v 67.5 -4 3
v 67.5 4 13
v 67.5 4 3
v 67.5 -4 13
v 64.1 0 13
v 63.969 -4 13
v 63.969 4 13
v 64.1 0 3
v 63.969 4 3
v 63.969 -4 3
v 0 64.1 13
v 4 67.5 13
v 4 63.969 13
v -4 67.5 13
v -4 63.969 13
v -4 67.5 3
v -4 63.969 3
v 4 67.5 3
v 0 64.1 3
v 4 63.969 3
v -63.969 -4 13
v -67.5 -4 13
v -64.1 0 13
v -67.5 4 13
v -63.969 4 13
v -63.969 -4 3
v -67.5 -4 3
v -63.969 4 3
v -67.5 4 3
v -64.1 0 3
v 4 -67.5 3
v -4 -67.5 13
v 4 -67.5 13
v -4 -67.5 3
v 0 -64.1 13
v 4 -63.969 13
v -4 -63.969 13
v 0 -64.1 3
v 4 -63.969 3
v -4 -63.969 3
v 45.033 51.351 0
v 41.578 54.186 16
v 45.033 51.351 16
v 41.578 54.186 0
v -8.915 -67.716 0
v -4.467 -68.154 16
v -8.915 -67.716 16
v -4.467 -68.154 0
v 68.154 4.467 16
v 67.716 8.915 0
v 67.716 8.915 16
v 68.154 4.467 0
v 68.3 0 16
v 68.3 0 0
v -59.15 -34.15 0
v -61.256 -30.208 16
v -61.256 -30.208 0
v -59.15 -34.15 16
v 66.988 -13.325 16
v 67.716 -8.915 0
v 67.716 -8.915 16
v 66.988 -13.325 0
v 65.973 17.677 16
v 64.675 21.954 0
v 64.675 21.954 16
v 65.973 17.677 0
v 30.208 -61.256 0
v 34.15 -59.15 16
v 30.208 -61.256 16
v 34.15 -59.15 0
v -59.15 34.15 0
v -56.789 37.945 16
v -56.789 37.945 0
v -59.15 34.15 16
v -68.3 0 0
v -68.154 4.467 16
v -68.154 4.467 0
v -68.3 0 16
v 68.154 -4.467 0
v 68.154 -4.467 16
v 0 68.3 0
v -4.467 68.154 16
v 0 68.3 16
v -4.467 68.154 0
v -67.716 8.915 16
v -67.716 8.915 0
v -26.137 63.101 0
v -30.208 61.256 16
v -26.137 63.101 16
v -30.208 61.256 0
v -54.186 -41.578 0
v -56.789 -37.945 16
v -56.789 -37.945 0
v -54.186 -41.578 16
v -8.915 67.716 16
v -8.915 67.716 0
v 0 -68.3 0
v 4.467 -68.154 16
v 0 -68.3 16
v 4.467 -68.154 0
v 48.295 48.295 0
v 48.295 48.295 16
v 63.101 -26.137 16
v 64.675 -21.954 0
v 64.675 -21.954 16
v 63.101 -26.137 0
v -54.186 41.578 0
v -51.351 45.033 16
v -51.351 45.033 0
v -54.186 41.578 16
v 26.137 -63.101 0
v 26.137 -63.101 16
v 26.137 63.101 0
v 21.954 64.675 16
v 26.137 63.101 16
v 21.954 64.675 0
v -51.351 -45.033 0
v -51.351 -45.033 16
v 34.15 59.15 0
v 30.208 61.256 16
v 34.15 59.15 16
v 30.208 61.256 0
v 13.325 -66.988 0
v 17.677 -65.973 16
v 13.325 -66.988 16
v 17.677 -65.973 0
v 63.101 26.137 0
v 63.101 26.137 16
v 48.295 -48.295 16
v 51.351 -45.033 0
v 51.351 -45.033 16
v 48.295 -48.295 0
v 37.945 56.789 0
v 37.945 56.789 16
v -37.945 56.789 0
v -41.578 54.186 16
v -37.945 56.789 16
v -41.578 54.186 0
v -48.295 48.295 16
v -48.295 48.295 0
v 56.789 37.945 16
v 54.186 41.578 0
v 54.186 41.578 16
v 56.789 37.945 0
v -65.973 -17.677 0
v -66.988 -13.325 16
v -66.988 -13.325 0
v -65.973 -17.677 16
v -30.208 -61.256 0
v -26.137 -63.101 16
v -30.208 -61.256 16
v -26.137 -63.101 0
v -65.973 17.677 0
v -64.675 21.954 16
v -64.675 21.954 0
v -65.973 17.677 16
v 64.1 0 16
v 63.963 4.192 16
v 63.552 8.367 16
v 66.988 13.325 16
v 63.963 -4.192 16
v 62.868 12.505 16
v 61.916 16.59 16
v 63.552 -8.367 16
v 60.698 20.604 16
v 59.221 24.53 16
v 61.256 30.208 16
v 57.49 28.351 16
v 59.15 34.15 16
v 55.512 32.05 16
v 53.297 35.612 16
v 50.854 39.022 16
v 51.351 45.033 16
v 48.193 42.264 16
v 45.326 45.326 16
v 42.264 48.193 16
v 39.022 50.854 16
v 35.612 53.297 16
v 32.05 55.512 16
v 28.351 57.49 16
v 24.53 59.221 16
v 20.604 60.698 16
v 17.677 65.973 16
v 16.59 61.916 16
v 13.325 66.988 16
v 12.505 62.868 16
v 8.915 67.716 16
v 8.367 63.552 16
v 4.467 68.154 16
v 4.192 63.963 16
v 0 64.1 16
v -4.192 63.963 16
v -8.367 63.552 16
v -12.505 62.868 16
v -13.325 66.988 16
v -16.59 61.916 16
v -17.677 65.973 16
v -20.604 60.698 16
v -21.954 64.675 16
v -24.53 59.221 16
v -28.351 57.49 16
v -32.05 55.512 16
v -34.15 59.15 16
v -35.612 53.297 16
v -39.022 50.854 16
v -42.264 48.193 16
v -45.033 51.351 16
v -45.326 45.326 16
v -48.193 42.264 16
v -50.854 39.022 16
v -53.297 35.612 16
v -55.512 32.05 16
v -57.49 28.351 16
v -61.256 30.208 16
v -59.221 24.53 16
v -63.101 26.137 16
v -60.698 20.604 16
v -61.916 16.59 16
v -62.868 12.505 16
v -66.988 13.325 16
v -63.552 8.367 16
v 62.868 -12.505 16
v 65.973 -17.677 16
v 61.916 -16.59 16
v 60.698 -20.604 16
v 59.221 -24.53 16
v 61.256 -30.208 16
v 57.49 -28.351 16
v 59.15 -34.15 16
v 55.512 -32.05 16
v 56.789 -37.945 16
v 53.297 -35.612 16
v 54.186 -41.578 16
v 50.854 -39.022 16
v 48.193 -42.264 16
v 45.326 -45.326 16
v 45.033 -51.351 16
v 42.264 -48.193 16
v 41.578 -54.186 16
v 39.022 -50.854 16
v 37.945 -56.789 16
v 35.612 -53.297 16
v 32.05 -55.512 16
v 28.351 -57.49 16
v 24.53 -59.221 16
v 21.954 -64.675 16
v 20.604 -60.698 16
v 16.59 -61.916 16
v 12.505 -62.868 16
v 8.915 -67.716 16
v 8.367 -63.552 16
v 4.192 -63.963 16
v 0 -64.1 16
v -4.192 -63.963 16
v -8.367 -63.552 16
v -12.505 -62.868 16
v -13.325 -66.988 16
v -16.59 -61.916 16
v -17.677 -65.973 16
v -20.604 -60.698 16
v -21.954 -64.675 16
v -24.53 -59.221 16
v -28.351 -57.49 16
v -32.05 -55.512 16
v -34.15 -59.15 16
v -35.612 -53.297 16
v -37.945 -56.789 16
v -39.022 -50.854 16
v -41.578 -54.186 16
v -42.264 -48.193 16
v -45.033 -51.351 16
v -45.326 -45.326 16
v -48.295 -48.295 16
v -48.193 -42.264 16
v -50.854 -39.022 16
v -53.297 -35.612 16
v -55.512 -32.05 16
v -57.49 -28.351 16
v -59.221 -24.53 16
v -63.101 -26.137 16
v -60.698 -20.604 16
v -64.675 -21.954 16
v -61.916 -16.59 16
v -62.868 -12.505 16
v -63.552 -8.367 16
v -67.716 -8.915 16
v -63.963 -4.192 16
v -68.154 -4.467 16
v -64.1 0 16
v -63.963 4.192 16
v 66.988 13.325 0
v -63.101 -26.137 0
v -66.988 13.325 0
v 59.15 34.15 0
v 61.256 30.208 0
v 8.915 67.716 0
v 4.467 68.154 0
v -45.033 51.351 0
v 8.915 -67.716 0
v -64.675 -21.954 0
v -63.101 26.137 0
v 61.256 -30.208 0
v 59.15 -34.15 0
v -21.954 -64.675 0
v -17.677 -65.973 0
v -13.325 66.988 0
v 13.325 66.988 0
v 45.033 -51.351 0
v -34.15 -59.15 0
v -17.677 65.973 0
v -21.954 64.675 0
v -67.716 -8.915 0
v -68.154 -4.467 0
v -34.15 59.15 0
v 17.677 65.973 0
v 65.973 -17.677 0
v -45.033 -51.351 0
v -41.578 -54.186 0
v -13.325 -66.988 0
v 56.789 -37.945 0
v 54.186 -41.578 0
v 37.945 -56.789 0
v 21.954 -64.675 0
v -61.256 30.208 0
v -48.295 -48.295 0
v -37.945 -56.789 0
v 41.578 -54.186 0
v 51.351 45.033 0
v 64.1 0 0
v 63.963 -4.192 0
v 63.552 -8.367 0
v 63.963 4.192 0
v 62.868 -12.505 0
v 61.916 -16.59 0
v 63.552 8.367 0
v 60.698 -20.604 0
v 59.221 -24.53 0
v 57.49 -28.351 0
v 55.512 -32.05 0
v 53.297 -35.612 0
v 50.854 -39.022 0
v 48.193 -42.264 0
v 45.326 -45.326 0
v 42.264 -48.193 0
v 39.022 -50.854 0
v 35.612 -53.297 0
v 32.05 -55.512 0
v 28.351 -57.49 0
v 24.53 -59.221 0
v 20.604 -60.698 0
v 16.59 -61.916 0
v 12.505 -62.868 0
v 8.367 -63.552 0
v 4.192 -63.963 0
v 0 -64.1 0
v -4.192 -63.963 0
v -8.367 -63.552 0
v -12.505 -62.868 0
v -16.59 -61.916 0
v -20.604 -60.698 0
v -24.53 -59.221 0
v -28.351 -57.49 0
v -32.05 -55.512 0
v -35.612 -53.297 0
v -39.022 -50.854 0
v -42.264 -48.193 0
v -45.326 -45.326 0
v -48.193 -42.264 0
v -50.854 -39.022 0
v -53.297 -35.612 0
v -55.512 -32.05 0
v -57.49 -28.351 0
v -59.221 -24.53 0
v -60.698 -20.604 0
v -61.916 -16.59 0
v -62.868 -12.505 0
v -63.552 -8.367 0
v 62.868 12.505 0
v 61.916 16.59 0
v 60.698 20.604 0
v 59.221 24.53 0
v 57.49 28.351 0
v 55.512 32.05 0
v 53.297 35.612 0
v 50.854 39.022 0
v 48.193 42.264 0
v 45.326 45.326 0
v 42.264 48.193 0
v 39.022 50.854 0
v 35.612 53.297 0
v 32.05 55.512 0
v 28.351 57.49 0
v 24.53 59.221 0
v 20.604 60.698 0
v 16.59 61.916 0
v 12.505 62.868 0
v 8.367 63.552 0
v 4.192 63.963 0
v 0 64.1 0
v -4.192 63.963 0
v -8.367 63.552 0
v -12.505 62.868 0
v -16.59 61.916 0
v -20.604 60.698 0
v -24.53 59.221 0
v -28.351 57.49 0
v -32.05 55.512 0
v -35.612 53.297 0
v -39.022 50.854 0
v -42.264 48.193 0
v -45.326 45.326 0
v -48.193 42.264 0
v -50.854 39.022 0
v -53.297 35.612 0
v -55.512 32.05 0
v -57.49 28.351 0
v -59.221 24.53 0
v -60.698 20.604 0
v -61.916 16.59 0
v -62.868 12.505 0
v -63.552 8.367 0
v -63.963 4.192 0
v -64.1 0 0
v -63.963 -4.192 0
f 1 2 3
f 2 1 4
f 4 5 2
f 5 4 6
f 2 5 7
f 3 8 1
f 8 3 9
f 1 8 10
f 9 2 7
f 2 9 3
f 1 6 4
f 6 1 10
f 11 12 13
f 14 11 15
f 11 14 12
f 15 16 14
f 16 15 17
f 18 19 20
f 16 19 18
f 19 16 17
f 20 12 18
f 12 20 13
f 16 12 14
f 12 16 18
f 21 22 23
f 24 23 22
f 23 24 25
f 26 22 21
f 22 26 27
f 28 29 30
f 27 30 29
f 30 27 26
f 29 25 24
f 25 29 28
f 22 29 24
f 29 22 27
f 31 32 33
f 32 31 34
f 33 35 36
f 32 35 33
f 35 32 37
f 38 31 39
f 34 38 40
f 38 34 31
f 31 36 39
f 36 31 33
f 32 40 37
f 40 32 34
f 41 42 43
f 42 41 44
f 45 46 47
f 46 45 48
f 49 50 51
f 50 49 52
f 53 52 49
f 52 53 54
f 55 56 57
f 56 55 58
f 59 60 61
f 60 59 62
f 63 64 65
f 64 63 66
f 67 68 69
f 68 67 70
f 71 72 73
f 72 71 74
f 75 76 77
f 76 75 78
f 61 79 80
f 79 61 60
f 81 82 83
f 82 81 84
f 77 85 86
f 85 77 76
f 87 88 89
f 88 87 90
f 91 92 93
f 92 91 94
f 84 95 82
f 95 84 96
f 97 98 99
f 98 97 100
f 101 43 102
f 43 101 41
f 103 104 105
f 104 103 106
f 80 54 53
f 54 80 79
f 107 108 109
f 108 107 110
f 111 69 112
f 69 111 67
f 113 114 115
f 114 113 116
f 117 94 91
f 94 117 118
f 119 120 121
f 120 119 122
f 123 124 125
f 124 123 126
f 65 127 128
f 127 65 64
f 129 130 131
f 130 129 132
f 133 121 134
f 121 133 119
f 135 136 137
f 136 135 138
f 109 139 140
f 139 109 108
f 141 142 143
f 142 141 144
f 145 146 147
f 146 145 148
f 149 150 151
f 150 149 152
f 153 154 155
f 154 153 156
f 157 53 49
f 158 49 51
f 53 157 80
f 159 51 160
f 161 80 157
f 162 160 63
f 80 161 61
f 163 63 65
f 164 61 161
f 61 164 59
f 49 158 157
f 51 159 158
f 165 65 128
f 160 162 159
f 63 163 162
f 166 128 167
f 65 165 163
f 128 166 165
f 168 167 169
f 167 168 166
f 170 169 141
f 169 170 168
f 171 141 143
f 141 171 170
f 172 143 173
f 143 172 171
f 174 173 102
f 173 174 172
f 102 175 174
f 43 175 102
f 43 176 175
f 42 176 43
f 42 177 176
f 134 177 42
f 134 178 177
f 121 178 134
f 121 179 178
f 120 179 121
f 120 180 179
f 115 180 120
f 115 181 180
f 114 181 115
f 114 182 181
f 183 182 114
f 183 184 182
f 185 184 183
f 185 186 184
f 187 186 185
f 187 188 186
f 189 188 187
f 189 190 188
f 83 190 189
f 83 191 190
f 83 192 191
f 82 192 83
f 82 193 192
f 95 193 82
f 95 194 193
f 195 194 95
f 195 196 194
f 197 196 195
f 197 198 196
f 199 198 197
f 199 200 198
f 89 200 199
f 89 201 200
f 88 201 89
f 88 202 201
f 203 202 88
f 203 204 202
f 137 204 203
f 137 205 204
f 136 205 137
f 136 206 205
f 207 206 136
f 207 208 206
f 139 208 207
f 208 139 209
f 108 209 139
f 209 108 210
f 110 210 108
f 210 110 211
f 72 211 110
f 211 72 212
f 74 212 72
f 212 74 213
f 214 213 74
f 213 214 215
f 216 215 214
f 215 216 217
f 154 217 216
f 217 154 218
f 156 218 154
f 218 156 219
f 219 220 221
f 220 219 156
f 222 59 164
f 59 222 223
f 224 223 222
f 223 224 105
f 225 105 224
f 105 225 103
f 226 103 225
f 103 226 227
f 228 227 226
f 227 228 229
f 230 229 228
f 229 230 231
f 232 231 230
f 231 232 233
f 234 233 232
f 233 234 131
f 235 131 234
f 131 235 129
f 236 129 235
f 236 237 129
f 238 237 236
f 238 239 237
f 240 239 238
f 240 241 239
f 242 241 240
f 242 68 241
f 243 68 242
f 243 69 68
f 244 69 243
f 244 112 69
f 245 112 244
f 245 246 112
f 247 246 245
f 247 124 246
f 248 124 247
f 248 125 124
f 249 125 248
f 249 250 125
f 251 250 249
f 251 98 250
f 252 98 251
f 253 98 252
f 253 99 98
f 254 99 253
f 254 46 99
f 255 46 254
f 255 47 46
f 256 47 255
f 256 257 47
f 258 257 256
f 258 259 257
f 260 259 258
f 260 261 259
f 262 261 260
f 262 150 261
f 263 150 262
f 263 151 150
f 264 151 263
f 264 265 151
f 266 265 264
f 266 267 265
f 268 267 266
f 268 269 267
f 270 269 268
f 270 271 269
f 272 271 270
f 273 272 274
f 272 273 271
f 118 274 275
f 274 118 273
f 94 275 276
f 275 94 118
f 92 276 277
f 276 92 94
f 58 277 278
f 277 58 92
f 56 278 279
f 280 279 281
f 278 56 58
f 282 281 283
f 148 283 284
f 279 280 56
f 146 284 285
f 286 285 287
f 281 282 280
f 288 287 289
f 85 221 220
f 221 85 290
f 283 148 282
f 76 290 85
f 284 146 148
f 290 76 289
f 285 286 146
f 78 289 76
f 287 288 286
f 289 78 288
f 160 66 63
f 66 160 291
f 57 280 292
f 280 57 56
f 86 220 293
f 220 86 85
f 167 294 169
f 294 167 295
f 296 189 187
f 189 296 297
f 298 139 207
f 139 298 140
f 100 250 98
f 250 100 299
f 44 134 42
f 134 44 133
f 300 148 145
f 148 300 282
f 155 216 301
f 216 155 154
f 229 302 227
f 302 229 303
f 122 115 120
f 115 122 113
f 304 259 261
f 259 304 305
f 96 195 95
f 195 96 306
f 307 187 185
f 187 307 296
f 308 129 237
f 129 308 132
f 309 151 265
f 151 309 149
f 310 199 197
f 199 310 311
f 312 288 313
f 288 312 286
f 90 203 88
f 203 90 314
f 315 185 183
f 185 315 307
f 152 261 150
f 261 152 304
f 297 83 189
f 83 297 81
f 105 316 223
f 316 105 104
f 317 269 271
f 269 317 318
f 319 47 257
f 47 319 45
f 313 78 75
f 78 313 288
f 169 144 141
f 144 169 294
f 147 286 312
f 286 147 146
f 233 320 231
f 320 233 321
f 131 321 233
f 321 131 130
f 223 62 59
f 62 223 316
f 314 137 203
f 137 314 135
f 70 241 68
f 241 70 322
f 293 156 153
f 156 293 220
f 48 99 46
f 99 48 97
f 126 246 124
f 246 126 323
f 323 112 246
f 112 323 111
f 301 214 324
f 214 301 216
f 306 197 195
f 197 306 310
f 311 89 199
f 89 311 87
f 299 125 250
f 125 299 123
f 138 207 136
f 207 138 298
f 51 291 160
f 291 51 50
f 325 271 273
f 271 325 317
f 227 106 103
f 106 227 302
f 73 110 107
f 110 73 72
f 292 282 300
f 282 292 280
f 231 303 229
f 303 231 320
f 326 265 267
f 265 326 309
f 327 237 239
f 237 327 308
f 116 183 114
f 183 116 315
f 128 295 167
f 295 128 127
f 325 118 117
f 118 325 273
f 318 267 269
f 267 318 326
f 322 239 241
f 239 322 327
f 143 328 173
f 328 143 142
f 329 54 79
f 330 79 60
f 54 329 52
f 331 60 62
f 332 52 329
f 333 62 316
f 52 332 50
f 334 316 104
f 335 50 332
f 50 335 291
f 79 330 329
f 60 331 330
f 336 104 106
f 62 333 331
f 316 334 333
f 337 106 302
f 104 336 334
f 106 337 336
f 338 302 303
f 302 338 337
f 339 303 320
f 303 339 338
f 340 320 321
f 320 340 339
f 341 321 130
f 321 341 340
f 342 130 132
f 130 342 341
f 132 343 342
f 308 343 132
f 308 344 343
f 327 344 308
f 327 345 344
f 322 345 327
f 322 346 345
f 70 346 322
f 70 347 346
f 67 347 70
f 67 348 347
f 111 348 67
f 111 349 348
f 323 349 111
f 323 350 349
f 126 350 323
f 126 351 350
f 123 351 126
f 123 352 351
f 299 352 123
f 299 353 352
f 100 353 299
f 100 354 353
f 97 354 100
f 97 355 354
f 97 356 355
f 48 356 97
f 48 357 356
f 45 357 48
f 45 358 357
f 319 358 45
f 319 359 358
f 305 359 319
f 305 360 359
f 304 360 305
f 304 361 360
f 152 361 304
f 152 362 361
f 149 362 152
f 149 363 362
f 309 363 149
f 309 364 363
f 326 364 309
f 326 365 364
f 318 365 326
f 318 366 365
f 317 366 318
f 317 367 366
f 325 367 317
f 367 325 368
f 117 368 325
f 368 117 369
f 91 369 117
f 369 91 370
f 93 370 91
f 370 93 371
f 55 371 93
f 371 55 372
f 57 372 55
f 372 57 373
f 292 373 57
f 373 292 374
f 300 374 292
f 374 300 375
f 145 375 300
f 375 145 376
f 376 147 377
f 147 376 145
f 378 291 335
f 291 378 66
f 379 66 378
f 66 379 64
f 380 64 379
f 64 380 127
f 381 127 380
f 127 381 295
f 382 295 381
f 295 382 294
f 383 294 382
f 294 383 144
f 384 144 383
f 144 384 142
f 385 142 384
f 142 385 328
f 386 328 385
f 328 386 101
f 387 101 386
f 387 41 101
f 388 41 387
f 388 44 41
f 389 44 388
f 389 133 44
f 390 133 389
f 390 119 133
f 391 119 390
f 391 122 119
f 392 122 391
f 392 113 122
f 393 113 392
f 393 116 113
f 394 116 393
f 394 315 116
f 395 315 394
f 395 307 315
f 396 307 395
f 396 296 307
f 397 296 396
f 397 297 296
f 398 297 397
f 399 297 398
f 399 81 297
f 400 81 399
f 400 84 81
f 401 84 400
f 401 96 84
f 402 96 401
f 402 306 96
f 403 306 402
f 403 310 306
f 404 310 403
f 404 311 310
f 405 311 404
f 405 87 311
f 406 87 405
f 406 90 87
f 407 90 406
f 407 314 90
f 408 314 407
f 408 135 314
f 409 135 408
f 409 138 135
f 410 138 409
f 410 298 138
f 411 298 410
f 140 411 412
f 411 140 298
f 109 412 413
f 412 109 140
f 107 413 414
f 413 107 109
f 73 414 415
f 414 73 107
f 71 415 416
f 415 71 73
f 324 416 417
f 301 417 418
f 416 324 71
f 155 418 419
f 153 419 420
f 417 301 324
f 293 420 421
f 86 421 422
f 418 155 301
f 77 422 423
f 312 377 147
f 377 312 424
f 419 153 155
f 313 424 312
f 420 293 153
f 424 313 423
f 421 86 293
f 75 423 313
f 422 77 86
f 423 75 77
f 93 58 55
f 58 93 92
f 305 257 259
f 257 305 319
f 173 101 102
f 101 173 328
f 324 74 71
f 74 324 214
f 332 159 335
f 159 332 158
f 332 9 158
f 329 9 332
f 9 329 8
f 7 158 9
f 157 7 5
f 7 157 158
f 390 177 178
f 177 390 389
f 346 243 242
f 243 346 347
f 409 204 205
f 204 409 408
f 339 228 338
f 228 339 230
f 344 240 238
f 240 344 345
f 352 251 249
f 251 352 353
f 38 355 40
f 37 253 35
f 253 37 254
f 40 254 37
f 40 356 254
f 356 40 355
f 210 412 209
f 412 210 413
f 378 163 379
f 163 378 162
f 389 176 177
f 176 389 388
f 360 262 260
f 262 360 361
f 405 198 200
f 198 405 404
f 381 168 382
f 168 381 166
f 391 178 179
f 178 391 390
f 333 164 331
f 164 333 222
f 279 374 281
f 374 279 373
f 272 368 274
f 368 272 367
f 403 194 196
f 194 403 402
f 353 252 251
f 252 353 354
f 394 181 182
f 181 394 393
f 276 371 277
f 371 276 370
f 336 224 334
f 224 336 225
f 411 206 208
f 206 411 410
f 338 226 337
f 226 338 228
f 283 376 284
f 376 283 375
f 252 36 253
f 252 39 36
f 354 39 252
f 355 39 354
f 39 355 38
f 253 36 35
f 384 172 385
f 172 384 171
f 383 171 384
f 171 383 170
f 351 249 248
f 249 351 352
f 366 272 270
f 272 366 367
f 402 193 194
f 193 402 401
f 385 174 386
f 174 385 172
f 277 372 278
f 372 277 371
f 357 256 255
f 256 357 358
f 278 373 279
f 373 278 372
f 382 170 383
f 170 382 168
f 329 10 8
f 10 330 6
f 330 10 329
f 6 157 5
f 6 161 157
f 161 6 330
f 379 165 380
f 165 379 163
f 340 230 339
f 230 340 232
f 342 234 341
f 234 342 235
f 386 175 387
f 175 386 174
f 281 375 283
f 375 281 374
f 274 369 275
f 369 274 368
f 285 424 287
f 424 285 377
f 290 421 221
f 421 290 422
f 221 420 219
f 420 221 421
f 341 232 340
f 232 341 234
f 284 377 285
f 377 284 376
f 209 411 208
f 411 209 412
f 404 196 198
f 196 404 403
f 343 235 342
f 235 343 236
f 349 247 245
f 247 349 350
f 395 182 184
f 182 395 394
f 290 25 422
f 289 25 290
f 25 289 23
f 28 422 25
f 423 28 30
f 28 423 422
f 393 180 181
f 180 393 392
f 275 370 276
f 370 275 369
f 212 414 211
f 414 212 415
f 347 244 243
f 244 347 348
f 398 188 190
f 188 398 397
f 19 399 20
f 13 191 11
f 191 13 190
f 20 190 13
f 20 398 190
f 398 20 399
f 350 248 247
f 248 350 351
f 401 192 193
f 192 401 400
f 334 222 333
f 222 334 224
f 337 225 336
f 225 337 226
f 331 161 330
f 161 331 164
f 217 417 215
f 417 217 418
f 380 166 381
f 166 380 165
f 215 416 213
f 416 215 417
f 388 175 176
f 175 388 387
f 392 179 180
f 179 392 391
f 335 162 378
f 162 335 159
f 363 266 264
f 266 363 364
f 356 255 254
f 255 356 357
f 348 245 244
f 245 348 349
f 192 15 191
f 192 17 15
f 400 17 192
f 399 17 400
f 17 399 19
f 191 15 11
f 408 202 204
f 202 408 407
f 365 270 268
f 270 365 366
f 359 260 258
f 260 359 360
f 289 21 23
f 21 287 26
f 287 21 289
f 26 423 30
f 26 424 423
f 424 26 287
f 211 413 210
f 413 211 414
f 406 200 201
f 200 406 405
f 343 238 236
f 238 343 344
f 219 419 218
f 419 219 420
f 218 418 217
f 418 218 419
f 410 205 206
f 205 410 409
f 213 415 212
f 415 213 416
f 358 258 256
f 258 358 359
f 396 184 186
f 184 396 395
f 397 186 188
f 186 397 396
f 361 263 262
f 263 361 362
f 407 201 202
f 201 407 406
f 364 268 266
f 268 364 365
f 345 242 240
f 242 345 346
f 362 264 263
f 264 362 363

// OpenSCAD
// file: config.scad
// SportCam — shared parametric dimensions (mm).
// Every part file includes this; tweak here, re-render, everything stays consistent.
//
// This is the **PTZ-base build**: the camera, pan and tilt all come from the
// Arducam IMX477 PTZ camera with metal pan-tilt base (B0167B12), which bolts
// to the lid of a static enclosure. There is no pan stage, slip ring or
// tilt tower to print — see docs/02-hardware-mechanical.md.
//
// This is the **camera-only variant**: no UWB anchors, no mast, no wearable.
// The camera finds and follows a person by vision alone.

$fn = 96;
clr = 0.25;                    // general printed-fit clearance per side

// ---- enclosure -------------------------------------------------------------
// Holds the Pi 5 (85 × 56) flat on standoffs, the 5 V distribution and the
// LED ring. The lid carries the Arducam pan-tilt base.
base_d        = 135;           // outer diameter — the Pi plus the power boards
                               // need this much floor; see base_housing.scad
base_h        = 66;            // floor to lid underside
base_wall     = 3;
lid_t         = 5;             // lid is structural: it carries the whole camera
led_window_h  = 12;            // circumferential LED slot
led_window_z  = 20;

jack_d        = 8.2;           // 5 V barrel jack, panel mount
// Tripod socket: a 3/8-16 brass insert, which takes a 3/8-16 tripod screw
// directly and a 1/4-20 one through a removable 3/8→1/4 reducer bushing —
// so it fits every photo and video tripod. The boss is 8 mm tall because
// the Pi sits 6 mm above the floor over it: use an insert no longer than
// that (or file one down).
tripod_boss_d = 24;
tripod_boss_h = 8;
tripod_hole_d = 12.7;          // MEASURE YOUR INSERT: epoxied, so a snug slip fit

pi_l = 85; pi_w = 56;          // Raspberry Pi 5
pi_hole_dx = 58; pi_hole_dy = 49;
pi_standoff_h = 6;
pi_x_off      = -10;           // Pi sits off-centre, leaving the +X side for power

// ---- Arducam pan-tilt base interface ---------------------------------------
// MEASURE YOURS. Arducam publishes no drawing for the B0167B12 metal base and
// the footprint has changed between revisions, so the lid is cut with **slots**
// spanning the range below rather than fixed holes. If your base's bolt
// spacing falls outside it, edit these two numbers and re-render.
ptz_bolt_min  = 30;            // narrowest bolt spacing the slots accept
ptz_bolt_max  = 72;            // widest
ptz_slot_w    = 3.4;           // M3 clearance
ptz_cable_d   = 34;            // central opening: CSI ribbon + servo leads drop through

// ---- battery tray ----------------------------------------------------------
// Sized to a 25 000 mAh USB-C PD power bank. MEASURE YOURS — banks of the
// same capacity vary by 15 mm in every direction. The tray straps to a tripod
// leg or centre column, or sandwiches under the enclosure on a long 1/4-20
// (into the reducer bushing).
bank_l = 150; bank_w = 72; bank_h = 30;
tray_wall = 2.4;
tray_lip = 10;                 // how far the side walls come up the bank
tray_strap_w = 26;             // hook-and-loop strap slots
// main file
// Translucent diffuser band that closes the enclosure's LED window.
// Print in white/natural PETG, 2 perimeters, 0% infill, no top/bottom.
include <config.scad>

lip = 2;

module led_diffuser_ring() {
    difference() {
        cylinder(d = base_d + 1.6, h = led_window_h + 2 * lip);
        translate([0, 0, -1])
            cylinder(d = base_d - 2 * base_wall - 0.8, h = led_window_h + 2 * lip + 2);
        // snap reliefs: 4 shallow finger cuts on the inside lip
        for (a = [0:90:270])
            rotate([0, 0, a])
                translate([base_d / 2 - base_wall, 0, led_window_h / 2 + lip])
                    cube([base_wall * 2, 8, led_window_h - 2], center = true);
    }
}

led_diffuser_ring();
